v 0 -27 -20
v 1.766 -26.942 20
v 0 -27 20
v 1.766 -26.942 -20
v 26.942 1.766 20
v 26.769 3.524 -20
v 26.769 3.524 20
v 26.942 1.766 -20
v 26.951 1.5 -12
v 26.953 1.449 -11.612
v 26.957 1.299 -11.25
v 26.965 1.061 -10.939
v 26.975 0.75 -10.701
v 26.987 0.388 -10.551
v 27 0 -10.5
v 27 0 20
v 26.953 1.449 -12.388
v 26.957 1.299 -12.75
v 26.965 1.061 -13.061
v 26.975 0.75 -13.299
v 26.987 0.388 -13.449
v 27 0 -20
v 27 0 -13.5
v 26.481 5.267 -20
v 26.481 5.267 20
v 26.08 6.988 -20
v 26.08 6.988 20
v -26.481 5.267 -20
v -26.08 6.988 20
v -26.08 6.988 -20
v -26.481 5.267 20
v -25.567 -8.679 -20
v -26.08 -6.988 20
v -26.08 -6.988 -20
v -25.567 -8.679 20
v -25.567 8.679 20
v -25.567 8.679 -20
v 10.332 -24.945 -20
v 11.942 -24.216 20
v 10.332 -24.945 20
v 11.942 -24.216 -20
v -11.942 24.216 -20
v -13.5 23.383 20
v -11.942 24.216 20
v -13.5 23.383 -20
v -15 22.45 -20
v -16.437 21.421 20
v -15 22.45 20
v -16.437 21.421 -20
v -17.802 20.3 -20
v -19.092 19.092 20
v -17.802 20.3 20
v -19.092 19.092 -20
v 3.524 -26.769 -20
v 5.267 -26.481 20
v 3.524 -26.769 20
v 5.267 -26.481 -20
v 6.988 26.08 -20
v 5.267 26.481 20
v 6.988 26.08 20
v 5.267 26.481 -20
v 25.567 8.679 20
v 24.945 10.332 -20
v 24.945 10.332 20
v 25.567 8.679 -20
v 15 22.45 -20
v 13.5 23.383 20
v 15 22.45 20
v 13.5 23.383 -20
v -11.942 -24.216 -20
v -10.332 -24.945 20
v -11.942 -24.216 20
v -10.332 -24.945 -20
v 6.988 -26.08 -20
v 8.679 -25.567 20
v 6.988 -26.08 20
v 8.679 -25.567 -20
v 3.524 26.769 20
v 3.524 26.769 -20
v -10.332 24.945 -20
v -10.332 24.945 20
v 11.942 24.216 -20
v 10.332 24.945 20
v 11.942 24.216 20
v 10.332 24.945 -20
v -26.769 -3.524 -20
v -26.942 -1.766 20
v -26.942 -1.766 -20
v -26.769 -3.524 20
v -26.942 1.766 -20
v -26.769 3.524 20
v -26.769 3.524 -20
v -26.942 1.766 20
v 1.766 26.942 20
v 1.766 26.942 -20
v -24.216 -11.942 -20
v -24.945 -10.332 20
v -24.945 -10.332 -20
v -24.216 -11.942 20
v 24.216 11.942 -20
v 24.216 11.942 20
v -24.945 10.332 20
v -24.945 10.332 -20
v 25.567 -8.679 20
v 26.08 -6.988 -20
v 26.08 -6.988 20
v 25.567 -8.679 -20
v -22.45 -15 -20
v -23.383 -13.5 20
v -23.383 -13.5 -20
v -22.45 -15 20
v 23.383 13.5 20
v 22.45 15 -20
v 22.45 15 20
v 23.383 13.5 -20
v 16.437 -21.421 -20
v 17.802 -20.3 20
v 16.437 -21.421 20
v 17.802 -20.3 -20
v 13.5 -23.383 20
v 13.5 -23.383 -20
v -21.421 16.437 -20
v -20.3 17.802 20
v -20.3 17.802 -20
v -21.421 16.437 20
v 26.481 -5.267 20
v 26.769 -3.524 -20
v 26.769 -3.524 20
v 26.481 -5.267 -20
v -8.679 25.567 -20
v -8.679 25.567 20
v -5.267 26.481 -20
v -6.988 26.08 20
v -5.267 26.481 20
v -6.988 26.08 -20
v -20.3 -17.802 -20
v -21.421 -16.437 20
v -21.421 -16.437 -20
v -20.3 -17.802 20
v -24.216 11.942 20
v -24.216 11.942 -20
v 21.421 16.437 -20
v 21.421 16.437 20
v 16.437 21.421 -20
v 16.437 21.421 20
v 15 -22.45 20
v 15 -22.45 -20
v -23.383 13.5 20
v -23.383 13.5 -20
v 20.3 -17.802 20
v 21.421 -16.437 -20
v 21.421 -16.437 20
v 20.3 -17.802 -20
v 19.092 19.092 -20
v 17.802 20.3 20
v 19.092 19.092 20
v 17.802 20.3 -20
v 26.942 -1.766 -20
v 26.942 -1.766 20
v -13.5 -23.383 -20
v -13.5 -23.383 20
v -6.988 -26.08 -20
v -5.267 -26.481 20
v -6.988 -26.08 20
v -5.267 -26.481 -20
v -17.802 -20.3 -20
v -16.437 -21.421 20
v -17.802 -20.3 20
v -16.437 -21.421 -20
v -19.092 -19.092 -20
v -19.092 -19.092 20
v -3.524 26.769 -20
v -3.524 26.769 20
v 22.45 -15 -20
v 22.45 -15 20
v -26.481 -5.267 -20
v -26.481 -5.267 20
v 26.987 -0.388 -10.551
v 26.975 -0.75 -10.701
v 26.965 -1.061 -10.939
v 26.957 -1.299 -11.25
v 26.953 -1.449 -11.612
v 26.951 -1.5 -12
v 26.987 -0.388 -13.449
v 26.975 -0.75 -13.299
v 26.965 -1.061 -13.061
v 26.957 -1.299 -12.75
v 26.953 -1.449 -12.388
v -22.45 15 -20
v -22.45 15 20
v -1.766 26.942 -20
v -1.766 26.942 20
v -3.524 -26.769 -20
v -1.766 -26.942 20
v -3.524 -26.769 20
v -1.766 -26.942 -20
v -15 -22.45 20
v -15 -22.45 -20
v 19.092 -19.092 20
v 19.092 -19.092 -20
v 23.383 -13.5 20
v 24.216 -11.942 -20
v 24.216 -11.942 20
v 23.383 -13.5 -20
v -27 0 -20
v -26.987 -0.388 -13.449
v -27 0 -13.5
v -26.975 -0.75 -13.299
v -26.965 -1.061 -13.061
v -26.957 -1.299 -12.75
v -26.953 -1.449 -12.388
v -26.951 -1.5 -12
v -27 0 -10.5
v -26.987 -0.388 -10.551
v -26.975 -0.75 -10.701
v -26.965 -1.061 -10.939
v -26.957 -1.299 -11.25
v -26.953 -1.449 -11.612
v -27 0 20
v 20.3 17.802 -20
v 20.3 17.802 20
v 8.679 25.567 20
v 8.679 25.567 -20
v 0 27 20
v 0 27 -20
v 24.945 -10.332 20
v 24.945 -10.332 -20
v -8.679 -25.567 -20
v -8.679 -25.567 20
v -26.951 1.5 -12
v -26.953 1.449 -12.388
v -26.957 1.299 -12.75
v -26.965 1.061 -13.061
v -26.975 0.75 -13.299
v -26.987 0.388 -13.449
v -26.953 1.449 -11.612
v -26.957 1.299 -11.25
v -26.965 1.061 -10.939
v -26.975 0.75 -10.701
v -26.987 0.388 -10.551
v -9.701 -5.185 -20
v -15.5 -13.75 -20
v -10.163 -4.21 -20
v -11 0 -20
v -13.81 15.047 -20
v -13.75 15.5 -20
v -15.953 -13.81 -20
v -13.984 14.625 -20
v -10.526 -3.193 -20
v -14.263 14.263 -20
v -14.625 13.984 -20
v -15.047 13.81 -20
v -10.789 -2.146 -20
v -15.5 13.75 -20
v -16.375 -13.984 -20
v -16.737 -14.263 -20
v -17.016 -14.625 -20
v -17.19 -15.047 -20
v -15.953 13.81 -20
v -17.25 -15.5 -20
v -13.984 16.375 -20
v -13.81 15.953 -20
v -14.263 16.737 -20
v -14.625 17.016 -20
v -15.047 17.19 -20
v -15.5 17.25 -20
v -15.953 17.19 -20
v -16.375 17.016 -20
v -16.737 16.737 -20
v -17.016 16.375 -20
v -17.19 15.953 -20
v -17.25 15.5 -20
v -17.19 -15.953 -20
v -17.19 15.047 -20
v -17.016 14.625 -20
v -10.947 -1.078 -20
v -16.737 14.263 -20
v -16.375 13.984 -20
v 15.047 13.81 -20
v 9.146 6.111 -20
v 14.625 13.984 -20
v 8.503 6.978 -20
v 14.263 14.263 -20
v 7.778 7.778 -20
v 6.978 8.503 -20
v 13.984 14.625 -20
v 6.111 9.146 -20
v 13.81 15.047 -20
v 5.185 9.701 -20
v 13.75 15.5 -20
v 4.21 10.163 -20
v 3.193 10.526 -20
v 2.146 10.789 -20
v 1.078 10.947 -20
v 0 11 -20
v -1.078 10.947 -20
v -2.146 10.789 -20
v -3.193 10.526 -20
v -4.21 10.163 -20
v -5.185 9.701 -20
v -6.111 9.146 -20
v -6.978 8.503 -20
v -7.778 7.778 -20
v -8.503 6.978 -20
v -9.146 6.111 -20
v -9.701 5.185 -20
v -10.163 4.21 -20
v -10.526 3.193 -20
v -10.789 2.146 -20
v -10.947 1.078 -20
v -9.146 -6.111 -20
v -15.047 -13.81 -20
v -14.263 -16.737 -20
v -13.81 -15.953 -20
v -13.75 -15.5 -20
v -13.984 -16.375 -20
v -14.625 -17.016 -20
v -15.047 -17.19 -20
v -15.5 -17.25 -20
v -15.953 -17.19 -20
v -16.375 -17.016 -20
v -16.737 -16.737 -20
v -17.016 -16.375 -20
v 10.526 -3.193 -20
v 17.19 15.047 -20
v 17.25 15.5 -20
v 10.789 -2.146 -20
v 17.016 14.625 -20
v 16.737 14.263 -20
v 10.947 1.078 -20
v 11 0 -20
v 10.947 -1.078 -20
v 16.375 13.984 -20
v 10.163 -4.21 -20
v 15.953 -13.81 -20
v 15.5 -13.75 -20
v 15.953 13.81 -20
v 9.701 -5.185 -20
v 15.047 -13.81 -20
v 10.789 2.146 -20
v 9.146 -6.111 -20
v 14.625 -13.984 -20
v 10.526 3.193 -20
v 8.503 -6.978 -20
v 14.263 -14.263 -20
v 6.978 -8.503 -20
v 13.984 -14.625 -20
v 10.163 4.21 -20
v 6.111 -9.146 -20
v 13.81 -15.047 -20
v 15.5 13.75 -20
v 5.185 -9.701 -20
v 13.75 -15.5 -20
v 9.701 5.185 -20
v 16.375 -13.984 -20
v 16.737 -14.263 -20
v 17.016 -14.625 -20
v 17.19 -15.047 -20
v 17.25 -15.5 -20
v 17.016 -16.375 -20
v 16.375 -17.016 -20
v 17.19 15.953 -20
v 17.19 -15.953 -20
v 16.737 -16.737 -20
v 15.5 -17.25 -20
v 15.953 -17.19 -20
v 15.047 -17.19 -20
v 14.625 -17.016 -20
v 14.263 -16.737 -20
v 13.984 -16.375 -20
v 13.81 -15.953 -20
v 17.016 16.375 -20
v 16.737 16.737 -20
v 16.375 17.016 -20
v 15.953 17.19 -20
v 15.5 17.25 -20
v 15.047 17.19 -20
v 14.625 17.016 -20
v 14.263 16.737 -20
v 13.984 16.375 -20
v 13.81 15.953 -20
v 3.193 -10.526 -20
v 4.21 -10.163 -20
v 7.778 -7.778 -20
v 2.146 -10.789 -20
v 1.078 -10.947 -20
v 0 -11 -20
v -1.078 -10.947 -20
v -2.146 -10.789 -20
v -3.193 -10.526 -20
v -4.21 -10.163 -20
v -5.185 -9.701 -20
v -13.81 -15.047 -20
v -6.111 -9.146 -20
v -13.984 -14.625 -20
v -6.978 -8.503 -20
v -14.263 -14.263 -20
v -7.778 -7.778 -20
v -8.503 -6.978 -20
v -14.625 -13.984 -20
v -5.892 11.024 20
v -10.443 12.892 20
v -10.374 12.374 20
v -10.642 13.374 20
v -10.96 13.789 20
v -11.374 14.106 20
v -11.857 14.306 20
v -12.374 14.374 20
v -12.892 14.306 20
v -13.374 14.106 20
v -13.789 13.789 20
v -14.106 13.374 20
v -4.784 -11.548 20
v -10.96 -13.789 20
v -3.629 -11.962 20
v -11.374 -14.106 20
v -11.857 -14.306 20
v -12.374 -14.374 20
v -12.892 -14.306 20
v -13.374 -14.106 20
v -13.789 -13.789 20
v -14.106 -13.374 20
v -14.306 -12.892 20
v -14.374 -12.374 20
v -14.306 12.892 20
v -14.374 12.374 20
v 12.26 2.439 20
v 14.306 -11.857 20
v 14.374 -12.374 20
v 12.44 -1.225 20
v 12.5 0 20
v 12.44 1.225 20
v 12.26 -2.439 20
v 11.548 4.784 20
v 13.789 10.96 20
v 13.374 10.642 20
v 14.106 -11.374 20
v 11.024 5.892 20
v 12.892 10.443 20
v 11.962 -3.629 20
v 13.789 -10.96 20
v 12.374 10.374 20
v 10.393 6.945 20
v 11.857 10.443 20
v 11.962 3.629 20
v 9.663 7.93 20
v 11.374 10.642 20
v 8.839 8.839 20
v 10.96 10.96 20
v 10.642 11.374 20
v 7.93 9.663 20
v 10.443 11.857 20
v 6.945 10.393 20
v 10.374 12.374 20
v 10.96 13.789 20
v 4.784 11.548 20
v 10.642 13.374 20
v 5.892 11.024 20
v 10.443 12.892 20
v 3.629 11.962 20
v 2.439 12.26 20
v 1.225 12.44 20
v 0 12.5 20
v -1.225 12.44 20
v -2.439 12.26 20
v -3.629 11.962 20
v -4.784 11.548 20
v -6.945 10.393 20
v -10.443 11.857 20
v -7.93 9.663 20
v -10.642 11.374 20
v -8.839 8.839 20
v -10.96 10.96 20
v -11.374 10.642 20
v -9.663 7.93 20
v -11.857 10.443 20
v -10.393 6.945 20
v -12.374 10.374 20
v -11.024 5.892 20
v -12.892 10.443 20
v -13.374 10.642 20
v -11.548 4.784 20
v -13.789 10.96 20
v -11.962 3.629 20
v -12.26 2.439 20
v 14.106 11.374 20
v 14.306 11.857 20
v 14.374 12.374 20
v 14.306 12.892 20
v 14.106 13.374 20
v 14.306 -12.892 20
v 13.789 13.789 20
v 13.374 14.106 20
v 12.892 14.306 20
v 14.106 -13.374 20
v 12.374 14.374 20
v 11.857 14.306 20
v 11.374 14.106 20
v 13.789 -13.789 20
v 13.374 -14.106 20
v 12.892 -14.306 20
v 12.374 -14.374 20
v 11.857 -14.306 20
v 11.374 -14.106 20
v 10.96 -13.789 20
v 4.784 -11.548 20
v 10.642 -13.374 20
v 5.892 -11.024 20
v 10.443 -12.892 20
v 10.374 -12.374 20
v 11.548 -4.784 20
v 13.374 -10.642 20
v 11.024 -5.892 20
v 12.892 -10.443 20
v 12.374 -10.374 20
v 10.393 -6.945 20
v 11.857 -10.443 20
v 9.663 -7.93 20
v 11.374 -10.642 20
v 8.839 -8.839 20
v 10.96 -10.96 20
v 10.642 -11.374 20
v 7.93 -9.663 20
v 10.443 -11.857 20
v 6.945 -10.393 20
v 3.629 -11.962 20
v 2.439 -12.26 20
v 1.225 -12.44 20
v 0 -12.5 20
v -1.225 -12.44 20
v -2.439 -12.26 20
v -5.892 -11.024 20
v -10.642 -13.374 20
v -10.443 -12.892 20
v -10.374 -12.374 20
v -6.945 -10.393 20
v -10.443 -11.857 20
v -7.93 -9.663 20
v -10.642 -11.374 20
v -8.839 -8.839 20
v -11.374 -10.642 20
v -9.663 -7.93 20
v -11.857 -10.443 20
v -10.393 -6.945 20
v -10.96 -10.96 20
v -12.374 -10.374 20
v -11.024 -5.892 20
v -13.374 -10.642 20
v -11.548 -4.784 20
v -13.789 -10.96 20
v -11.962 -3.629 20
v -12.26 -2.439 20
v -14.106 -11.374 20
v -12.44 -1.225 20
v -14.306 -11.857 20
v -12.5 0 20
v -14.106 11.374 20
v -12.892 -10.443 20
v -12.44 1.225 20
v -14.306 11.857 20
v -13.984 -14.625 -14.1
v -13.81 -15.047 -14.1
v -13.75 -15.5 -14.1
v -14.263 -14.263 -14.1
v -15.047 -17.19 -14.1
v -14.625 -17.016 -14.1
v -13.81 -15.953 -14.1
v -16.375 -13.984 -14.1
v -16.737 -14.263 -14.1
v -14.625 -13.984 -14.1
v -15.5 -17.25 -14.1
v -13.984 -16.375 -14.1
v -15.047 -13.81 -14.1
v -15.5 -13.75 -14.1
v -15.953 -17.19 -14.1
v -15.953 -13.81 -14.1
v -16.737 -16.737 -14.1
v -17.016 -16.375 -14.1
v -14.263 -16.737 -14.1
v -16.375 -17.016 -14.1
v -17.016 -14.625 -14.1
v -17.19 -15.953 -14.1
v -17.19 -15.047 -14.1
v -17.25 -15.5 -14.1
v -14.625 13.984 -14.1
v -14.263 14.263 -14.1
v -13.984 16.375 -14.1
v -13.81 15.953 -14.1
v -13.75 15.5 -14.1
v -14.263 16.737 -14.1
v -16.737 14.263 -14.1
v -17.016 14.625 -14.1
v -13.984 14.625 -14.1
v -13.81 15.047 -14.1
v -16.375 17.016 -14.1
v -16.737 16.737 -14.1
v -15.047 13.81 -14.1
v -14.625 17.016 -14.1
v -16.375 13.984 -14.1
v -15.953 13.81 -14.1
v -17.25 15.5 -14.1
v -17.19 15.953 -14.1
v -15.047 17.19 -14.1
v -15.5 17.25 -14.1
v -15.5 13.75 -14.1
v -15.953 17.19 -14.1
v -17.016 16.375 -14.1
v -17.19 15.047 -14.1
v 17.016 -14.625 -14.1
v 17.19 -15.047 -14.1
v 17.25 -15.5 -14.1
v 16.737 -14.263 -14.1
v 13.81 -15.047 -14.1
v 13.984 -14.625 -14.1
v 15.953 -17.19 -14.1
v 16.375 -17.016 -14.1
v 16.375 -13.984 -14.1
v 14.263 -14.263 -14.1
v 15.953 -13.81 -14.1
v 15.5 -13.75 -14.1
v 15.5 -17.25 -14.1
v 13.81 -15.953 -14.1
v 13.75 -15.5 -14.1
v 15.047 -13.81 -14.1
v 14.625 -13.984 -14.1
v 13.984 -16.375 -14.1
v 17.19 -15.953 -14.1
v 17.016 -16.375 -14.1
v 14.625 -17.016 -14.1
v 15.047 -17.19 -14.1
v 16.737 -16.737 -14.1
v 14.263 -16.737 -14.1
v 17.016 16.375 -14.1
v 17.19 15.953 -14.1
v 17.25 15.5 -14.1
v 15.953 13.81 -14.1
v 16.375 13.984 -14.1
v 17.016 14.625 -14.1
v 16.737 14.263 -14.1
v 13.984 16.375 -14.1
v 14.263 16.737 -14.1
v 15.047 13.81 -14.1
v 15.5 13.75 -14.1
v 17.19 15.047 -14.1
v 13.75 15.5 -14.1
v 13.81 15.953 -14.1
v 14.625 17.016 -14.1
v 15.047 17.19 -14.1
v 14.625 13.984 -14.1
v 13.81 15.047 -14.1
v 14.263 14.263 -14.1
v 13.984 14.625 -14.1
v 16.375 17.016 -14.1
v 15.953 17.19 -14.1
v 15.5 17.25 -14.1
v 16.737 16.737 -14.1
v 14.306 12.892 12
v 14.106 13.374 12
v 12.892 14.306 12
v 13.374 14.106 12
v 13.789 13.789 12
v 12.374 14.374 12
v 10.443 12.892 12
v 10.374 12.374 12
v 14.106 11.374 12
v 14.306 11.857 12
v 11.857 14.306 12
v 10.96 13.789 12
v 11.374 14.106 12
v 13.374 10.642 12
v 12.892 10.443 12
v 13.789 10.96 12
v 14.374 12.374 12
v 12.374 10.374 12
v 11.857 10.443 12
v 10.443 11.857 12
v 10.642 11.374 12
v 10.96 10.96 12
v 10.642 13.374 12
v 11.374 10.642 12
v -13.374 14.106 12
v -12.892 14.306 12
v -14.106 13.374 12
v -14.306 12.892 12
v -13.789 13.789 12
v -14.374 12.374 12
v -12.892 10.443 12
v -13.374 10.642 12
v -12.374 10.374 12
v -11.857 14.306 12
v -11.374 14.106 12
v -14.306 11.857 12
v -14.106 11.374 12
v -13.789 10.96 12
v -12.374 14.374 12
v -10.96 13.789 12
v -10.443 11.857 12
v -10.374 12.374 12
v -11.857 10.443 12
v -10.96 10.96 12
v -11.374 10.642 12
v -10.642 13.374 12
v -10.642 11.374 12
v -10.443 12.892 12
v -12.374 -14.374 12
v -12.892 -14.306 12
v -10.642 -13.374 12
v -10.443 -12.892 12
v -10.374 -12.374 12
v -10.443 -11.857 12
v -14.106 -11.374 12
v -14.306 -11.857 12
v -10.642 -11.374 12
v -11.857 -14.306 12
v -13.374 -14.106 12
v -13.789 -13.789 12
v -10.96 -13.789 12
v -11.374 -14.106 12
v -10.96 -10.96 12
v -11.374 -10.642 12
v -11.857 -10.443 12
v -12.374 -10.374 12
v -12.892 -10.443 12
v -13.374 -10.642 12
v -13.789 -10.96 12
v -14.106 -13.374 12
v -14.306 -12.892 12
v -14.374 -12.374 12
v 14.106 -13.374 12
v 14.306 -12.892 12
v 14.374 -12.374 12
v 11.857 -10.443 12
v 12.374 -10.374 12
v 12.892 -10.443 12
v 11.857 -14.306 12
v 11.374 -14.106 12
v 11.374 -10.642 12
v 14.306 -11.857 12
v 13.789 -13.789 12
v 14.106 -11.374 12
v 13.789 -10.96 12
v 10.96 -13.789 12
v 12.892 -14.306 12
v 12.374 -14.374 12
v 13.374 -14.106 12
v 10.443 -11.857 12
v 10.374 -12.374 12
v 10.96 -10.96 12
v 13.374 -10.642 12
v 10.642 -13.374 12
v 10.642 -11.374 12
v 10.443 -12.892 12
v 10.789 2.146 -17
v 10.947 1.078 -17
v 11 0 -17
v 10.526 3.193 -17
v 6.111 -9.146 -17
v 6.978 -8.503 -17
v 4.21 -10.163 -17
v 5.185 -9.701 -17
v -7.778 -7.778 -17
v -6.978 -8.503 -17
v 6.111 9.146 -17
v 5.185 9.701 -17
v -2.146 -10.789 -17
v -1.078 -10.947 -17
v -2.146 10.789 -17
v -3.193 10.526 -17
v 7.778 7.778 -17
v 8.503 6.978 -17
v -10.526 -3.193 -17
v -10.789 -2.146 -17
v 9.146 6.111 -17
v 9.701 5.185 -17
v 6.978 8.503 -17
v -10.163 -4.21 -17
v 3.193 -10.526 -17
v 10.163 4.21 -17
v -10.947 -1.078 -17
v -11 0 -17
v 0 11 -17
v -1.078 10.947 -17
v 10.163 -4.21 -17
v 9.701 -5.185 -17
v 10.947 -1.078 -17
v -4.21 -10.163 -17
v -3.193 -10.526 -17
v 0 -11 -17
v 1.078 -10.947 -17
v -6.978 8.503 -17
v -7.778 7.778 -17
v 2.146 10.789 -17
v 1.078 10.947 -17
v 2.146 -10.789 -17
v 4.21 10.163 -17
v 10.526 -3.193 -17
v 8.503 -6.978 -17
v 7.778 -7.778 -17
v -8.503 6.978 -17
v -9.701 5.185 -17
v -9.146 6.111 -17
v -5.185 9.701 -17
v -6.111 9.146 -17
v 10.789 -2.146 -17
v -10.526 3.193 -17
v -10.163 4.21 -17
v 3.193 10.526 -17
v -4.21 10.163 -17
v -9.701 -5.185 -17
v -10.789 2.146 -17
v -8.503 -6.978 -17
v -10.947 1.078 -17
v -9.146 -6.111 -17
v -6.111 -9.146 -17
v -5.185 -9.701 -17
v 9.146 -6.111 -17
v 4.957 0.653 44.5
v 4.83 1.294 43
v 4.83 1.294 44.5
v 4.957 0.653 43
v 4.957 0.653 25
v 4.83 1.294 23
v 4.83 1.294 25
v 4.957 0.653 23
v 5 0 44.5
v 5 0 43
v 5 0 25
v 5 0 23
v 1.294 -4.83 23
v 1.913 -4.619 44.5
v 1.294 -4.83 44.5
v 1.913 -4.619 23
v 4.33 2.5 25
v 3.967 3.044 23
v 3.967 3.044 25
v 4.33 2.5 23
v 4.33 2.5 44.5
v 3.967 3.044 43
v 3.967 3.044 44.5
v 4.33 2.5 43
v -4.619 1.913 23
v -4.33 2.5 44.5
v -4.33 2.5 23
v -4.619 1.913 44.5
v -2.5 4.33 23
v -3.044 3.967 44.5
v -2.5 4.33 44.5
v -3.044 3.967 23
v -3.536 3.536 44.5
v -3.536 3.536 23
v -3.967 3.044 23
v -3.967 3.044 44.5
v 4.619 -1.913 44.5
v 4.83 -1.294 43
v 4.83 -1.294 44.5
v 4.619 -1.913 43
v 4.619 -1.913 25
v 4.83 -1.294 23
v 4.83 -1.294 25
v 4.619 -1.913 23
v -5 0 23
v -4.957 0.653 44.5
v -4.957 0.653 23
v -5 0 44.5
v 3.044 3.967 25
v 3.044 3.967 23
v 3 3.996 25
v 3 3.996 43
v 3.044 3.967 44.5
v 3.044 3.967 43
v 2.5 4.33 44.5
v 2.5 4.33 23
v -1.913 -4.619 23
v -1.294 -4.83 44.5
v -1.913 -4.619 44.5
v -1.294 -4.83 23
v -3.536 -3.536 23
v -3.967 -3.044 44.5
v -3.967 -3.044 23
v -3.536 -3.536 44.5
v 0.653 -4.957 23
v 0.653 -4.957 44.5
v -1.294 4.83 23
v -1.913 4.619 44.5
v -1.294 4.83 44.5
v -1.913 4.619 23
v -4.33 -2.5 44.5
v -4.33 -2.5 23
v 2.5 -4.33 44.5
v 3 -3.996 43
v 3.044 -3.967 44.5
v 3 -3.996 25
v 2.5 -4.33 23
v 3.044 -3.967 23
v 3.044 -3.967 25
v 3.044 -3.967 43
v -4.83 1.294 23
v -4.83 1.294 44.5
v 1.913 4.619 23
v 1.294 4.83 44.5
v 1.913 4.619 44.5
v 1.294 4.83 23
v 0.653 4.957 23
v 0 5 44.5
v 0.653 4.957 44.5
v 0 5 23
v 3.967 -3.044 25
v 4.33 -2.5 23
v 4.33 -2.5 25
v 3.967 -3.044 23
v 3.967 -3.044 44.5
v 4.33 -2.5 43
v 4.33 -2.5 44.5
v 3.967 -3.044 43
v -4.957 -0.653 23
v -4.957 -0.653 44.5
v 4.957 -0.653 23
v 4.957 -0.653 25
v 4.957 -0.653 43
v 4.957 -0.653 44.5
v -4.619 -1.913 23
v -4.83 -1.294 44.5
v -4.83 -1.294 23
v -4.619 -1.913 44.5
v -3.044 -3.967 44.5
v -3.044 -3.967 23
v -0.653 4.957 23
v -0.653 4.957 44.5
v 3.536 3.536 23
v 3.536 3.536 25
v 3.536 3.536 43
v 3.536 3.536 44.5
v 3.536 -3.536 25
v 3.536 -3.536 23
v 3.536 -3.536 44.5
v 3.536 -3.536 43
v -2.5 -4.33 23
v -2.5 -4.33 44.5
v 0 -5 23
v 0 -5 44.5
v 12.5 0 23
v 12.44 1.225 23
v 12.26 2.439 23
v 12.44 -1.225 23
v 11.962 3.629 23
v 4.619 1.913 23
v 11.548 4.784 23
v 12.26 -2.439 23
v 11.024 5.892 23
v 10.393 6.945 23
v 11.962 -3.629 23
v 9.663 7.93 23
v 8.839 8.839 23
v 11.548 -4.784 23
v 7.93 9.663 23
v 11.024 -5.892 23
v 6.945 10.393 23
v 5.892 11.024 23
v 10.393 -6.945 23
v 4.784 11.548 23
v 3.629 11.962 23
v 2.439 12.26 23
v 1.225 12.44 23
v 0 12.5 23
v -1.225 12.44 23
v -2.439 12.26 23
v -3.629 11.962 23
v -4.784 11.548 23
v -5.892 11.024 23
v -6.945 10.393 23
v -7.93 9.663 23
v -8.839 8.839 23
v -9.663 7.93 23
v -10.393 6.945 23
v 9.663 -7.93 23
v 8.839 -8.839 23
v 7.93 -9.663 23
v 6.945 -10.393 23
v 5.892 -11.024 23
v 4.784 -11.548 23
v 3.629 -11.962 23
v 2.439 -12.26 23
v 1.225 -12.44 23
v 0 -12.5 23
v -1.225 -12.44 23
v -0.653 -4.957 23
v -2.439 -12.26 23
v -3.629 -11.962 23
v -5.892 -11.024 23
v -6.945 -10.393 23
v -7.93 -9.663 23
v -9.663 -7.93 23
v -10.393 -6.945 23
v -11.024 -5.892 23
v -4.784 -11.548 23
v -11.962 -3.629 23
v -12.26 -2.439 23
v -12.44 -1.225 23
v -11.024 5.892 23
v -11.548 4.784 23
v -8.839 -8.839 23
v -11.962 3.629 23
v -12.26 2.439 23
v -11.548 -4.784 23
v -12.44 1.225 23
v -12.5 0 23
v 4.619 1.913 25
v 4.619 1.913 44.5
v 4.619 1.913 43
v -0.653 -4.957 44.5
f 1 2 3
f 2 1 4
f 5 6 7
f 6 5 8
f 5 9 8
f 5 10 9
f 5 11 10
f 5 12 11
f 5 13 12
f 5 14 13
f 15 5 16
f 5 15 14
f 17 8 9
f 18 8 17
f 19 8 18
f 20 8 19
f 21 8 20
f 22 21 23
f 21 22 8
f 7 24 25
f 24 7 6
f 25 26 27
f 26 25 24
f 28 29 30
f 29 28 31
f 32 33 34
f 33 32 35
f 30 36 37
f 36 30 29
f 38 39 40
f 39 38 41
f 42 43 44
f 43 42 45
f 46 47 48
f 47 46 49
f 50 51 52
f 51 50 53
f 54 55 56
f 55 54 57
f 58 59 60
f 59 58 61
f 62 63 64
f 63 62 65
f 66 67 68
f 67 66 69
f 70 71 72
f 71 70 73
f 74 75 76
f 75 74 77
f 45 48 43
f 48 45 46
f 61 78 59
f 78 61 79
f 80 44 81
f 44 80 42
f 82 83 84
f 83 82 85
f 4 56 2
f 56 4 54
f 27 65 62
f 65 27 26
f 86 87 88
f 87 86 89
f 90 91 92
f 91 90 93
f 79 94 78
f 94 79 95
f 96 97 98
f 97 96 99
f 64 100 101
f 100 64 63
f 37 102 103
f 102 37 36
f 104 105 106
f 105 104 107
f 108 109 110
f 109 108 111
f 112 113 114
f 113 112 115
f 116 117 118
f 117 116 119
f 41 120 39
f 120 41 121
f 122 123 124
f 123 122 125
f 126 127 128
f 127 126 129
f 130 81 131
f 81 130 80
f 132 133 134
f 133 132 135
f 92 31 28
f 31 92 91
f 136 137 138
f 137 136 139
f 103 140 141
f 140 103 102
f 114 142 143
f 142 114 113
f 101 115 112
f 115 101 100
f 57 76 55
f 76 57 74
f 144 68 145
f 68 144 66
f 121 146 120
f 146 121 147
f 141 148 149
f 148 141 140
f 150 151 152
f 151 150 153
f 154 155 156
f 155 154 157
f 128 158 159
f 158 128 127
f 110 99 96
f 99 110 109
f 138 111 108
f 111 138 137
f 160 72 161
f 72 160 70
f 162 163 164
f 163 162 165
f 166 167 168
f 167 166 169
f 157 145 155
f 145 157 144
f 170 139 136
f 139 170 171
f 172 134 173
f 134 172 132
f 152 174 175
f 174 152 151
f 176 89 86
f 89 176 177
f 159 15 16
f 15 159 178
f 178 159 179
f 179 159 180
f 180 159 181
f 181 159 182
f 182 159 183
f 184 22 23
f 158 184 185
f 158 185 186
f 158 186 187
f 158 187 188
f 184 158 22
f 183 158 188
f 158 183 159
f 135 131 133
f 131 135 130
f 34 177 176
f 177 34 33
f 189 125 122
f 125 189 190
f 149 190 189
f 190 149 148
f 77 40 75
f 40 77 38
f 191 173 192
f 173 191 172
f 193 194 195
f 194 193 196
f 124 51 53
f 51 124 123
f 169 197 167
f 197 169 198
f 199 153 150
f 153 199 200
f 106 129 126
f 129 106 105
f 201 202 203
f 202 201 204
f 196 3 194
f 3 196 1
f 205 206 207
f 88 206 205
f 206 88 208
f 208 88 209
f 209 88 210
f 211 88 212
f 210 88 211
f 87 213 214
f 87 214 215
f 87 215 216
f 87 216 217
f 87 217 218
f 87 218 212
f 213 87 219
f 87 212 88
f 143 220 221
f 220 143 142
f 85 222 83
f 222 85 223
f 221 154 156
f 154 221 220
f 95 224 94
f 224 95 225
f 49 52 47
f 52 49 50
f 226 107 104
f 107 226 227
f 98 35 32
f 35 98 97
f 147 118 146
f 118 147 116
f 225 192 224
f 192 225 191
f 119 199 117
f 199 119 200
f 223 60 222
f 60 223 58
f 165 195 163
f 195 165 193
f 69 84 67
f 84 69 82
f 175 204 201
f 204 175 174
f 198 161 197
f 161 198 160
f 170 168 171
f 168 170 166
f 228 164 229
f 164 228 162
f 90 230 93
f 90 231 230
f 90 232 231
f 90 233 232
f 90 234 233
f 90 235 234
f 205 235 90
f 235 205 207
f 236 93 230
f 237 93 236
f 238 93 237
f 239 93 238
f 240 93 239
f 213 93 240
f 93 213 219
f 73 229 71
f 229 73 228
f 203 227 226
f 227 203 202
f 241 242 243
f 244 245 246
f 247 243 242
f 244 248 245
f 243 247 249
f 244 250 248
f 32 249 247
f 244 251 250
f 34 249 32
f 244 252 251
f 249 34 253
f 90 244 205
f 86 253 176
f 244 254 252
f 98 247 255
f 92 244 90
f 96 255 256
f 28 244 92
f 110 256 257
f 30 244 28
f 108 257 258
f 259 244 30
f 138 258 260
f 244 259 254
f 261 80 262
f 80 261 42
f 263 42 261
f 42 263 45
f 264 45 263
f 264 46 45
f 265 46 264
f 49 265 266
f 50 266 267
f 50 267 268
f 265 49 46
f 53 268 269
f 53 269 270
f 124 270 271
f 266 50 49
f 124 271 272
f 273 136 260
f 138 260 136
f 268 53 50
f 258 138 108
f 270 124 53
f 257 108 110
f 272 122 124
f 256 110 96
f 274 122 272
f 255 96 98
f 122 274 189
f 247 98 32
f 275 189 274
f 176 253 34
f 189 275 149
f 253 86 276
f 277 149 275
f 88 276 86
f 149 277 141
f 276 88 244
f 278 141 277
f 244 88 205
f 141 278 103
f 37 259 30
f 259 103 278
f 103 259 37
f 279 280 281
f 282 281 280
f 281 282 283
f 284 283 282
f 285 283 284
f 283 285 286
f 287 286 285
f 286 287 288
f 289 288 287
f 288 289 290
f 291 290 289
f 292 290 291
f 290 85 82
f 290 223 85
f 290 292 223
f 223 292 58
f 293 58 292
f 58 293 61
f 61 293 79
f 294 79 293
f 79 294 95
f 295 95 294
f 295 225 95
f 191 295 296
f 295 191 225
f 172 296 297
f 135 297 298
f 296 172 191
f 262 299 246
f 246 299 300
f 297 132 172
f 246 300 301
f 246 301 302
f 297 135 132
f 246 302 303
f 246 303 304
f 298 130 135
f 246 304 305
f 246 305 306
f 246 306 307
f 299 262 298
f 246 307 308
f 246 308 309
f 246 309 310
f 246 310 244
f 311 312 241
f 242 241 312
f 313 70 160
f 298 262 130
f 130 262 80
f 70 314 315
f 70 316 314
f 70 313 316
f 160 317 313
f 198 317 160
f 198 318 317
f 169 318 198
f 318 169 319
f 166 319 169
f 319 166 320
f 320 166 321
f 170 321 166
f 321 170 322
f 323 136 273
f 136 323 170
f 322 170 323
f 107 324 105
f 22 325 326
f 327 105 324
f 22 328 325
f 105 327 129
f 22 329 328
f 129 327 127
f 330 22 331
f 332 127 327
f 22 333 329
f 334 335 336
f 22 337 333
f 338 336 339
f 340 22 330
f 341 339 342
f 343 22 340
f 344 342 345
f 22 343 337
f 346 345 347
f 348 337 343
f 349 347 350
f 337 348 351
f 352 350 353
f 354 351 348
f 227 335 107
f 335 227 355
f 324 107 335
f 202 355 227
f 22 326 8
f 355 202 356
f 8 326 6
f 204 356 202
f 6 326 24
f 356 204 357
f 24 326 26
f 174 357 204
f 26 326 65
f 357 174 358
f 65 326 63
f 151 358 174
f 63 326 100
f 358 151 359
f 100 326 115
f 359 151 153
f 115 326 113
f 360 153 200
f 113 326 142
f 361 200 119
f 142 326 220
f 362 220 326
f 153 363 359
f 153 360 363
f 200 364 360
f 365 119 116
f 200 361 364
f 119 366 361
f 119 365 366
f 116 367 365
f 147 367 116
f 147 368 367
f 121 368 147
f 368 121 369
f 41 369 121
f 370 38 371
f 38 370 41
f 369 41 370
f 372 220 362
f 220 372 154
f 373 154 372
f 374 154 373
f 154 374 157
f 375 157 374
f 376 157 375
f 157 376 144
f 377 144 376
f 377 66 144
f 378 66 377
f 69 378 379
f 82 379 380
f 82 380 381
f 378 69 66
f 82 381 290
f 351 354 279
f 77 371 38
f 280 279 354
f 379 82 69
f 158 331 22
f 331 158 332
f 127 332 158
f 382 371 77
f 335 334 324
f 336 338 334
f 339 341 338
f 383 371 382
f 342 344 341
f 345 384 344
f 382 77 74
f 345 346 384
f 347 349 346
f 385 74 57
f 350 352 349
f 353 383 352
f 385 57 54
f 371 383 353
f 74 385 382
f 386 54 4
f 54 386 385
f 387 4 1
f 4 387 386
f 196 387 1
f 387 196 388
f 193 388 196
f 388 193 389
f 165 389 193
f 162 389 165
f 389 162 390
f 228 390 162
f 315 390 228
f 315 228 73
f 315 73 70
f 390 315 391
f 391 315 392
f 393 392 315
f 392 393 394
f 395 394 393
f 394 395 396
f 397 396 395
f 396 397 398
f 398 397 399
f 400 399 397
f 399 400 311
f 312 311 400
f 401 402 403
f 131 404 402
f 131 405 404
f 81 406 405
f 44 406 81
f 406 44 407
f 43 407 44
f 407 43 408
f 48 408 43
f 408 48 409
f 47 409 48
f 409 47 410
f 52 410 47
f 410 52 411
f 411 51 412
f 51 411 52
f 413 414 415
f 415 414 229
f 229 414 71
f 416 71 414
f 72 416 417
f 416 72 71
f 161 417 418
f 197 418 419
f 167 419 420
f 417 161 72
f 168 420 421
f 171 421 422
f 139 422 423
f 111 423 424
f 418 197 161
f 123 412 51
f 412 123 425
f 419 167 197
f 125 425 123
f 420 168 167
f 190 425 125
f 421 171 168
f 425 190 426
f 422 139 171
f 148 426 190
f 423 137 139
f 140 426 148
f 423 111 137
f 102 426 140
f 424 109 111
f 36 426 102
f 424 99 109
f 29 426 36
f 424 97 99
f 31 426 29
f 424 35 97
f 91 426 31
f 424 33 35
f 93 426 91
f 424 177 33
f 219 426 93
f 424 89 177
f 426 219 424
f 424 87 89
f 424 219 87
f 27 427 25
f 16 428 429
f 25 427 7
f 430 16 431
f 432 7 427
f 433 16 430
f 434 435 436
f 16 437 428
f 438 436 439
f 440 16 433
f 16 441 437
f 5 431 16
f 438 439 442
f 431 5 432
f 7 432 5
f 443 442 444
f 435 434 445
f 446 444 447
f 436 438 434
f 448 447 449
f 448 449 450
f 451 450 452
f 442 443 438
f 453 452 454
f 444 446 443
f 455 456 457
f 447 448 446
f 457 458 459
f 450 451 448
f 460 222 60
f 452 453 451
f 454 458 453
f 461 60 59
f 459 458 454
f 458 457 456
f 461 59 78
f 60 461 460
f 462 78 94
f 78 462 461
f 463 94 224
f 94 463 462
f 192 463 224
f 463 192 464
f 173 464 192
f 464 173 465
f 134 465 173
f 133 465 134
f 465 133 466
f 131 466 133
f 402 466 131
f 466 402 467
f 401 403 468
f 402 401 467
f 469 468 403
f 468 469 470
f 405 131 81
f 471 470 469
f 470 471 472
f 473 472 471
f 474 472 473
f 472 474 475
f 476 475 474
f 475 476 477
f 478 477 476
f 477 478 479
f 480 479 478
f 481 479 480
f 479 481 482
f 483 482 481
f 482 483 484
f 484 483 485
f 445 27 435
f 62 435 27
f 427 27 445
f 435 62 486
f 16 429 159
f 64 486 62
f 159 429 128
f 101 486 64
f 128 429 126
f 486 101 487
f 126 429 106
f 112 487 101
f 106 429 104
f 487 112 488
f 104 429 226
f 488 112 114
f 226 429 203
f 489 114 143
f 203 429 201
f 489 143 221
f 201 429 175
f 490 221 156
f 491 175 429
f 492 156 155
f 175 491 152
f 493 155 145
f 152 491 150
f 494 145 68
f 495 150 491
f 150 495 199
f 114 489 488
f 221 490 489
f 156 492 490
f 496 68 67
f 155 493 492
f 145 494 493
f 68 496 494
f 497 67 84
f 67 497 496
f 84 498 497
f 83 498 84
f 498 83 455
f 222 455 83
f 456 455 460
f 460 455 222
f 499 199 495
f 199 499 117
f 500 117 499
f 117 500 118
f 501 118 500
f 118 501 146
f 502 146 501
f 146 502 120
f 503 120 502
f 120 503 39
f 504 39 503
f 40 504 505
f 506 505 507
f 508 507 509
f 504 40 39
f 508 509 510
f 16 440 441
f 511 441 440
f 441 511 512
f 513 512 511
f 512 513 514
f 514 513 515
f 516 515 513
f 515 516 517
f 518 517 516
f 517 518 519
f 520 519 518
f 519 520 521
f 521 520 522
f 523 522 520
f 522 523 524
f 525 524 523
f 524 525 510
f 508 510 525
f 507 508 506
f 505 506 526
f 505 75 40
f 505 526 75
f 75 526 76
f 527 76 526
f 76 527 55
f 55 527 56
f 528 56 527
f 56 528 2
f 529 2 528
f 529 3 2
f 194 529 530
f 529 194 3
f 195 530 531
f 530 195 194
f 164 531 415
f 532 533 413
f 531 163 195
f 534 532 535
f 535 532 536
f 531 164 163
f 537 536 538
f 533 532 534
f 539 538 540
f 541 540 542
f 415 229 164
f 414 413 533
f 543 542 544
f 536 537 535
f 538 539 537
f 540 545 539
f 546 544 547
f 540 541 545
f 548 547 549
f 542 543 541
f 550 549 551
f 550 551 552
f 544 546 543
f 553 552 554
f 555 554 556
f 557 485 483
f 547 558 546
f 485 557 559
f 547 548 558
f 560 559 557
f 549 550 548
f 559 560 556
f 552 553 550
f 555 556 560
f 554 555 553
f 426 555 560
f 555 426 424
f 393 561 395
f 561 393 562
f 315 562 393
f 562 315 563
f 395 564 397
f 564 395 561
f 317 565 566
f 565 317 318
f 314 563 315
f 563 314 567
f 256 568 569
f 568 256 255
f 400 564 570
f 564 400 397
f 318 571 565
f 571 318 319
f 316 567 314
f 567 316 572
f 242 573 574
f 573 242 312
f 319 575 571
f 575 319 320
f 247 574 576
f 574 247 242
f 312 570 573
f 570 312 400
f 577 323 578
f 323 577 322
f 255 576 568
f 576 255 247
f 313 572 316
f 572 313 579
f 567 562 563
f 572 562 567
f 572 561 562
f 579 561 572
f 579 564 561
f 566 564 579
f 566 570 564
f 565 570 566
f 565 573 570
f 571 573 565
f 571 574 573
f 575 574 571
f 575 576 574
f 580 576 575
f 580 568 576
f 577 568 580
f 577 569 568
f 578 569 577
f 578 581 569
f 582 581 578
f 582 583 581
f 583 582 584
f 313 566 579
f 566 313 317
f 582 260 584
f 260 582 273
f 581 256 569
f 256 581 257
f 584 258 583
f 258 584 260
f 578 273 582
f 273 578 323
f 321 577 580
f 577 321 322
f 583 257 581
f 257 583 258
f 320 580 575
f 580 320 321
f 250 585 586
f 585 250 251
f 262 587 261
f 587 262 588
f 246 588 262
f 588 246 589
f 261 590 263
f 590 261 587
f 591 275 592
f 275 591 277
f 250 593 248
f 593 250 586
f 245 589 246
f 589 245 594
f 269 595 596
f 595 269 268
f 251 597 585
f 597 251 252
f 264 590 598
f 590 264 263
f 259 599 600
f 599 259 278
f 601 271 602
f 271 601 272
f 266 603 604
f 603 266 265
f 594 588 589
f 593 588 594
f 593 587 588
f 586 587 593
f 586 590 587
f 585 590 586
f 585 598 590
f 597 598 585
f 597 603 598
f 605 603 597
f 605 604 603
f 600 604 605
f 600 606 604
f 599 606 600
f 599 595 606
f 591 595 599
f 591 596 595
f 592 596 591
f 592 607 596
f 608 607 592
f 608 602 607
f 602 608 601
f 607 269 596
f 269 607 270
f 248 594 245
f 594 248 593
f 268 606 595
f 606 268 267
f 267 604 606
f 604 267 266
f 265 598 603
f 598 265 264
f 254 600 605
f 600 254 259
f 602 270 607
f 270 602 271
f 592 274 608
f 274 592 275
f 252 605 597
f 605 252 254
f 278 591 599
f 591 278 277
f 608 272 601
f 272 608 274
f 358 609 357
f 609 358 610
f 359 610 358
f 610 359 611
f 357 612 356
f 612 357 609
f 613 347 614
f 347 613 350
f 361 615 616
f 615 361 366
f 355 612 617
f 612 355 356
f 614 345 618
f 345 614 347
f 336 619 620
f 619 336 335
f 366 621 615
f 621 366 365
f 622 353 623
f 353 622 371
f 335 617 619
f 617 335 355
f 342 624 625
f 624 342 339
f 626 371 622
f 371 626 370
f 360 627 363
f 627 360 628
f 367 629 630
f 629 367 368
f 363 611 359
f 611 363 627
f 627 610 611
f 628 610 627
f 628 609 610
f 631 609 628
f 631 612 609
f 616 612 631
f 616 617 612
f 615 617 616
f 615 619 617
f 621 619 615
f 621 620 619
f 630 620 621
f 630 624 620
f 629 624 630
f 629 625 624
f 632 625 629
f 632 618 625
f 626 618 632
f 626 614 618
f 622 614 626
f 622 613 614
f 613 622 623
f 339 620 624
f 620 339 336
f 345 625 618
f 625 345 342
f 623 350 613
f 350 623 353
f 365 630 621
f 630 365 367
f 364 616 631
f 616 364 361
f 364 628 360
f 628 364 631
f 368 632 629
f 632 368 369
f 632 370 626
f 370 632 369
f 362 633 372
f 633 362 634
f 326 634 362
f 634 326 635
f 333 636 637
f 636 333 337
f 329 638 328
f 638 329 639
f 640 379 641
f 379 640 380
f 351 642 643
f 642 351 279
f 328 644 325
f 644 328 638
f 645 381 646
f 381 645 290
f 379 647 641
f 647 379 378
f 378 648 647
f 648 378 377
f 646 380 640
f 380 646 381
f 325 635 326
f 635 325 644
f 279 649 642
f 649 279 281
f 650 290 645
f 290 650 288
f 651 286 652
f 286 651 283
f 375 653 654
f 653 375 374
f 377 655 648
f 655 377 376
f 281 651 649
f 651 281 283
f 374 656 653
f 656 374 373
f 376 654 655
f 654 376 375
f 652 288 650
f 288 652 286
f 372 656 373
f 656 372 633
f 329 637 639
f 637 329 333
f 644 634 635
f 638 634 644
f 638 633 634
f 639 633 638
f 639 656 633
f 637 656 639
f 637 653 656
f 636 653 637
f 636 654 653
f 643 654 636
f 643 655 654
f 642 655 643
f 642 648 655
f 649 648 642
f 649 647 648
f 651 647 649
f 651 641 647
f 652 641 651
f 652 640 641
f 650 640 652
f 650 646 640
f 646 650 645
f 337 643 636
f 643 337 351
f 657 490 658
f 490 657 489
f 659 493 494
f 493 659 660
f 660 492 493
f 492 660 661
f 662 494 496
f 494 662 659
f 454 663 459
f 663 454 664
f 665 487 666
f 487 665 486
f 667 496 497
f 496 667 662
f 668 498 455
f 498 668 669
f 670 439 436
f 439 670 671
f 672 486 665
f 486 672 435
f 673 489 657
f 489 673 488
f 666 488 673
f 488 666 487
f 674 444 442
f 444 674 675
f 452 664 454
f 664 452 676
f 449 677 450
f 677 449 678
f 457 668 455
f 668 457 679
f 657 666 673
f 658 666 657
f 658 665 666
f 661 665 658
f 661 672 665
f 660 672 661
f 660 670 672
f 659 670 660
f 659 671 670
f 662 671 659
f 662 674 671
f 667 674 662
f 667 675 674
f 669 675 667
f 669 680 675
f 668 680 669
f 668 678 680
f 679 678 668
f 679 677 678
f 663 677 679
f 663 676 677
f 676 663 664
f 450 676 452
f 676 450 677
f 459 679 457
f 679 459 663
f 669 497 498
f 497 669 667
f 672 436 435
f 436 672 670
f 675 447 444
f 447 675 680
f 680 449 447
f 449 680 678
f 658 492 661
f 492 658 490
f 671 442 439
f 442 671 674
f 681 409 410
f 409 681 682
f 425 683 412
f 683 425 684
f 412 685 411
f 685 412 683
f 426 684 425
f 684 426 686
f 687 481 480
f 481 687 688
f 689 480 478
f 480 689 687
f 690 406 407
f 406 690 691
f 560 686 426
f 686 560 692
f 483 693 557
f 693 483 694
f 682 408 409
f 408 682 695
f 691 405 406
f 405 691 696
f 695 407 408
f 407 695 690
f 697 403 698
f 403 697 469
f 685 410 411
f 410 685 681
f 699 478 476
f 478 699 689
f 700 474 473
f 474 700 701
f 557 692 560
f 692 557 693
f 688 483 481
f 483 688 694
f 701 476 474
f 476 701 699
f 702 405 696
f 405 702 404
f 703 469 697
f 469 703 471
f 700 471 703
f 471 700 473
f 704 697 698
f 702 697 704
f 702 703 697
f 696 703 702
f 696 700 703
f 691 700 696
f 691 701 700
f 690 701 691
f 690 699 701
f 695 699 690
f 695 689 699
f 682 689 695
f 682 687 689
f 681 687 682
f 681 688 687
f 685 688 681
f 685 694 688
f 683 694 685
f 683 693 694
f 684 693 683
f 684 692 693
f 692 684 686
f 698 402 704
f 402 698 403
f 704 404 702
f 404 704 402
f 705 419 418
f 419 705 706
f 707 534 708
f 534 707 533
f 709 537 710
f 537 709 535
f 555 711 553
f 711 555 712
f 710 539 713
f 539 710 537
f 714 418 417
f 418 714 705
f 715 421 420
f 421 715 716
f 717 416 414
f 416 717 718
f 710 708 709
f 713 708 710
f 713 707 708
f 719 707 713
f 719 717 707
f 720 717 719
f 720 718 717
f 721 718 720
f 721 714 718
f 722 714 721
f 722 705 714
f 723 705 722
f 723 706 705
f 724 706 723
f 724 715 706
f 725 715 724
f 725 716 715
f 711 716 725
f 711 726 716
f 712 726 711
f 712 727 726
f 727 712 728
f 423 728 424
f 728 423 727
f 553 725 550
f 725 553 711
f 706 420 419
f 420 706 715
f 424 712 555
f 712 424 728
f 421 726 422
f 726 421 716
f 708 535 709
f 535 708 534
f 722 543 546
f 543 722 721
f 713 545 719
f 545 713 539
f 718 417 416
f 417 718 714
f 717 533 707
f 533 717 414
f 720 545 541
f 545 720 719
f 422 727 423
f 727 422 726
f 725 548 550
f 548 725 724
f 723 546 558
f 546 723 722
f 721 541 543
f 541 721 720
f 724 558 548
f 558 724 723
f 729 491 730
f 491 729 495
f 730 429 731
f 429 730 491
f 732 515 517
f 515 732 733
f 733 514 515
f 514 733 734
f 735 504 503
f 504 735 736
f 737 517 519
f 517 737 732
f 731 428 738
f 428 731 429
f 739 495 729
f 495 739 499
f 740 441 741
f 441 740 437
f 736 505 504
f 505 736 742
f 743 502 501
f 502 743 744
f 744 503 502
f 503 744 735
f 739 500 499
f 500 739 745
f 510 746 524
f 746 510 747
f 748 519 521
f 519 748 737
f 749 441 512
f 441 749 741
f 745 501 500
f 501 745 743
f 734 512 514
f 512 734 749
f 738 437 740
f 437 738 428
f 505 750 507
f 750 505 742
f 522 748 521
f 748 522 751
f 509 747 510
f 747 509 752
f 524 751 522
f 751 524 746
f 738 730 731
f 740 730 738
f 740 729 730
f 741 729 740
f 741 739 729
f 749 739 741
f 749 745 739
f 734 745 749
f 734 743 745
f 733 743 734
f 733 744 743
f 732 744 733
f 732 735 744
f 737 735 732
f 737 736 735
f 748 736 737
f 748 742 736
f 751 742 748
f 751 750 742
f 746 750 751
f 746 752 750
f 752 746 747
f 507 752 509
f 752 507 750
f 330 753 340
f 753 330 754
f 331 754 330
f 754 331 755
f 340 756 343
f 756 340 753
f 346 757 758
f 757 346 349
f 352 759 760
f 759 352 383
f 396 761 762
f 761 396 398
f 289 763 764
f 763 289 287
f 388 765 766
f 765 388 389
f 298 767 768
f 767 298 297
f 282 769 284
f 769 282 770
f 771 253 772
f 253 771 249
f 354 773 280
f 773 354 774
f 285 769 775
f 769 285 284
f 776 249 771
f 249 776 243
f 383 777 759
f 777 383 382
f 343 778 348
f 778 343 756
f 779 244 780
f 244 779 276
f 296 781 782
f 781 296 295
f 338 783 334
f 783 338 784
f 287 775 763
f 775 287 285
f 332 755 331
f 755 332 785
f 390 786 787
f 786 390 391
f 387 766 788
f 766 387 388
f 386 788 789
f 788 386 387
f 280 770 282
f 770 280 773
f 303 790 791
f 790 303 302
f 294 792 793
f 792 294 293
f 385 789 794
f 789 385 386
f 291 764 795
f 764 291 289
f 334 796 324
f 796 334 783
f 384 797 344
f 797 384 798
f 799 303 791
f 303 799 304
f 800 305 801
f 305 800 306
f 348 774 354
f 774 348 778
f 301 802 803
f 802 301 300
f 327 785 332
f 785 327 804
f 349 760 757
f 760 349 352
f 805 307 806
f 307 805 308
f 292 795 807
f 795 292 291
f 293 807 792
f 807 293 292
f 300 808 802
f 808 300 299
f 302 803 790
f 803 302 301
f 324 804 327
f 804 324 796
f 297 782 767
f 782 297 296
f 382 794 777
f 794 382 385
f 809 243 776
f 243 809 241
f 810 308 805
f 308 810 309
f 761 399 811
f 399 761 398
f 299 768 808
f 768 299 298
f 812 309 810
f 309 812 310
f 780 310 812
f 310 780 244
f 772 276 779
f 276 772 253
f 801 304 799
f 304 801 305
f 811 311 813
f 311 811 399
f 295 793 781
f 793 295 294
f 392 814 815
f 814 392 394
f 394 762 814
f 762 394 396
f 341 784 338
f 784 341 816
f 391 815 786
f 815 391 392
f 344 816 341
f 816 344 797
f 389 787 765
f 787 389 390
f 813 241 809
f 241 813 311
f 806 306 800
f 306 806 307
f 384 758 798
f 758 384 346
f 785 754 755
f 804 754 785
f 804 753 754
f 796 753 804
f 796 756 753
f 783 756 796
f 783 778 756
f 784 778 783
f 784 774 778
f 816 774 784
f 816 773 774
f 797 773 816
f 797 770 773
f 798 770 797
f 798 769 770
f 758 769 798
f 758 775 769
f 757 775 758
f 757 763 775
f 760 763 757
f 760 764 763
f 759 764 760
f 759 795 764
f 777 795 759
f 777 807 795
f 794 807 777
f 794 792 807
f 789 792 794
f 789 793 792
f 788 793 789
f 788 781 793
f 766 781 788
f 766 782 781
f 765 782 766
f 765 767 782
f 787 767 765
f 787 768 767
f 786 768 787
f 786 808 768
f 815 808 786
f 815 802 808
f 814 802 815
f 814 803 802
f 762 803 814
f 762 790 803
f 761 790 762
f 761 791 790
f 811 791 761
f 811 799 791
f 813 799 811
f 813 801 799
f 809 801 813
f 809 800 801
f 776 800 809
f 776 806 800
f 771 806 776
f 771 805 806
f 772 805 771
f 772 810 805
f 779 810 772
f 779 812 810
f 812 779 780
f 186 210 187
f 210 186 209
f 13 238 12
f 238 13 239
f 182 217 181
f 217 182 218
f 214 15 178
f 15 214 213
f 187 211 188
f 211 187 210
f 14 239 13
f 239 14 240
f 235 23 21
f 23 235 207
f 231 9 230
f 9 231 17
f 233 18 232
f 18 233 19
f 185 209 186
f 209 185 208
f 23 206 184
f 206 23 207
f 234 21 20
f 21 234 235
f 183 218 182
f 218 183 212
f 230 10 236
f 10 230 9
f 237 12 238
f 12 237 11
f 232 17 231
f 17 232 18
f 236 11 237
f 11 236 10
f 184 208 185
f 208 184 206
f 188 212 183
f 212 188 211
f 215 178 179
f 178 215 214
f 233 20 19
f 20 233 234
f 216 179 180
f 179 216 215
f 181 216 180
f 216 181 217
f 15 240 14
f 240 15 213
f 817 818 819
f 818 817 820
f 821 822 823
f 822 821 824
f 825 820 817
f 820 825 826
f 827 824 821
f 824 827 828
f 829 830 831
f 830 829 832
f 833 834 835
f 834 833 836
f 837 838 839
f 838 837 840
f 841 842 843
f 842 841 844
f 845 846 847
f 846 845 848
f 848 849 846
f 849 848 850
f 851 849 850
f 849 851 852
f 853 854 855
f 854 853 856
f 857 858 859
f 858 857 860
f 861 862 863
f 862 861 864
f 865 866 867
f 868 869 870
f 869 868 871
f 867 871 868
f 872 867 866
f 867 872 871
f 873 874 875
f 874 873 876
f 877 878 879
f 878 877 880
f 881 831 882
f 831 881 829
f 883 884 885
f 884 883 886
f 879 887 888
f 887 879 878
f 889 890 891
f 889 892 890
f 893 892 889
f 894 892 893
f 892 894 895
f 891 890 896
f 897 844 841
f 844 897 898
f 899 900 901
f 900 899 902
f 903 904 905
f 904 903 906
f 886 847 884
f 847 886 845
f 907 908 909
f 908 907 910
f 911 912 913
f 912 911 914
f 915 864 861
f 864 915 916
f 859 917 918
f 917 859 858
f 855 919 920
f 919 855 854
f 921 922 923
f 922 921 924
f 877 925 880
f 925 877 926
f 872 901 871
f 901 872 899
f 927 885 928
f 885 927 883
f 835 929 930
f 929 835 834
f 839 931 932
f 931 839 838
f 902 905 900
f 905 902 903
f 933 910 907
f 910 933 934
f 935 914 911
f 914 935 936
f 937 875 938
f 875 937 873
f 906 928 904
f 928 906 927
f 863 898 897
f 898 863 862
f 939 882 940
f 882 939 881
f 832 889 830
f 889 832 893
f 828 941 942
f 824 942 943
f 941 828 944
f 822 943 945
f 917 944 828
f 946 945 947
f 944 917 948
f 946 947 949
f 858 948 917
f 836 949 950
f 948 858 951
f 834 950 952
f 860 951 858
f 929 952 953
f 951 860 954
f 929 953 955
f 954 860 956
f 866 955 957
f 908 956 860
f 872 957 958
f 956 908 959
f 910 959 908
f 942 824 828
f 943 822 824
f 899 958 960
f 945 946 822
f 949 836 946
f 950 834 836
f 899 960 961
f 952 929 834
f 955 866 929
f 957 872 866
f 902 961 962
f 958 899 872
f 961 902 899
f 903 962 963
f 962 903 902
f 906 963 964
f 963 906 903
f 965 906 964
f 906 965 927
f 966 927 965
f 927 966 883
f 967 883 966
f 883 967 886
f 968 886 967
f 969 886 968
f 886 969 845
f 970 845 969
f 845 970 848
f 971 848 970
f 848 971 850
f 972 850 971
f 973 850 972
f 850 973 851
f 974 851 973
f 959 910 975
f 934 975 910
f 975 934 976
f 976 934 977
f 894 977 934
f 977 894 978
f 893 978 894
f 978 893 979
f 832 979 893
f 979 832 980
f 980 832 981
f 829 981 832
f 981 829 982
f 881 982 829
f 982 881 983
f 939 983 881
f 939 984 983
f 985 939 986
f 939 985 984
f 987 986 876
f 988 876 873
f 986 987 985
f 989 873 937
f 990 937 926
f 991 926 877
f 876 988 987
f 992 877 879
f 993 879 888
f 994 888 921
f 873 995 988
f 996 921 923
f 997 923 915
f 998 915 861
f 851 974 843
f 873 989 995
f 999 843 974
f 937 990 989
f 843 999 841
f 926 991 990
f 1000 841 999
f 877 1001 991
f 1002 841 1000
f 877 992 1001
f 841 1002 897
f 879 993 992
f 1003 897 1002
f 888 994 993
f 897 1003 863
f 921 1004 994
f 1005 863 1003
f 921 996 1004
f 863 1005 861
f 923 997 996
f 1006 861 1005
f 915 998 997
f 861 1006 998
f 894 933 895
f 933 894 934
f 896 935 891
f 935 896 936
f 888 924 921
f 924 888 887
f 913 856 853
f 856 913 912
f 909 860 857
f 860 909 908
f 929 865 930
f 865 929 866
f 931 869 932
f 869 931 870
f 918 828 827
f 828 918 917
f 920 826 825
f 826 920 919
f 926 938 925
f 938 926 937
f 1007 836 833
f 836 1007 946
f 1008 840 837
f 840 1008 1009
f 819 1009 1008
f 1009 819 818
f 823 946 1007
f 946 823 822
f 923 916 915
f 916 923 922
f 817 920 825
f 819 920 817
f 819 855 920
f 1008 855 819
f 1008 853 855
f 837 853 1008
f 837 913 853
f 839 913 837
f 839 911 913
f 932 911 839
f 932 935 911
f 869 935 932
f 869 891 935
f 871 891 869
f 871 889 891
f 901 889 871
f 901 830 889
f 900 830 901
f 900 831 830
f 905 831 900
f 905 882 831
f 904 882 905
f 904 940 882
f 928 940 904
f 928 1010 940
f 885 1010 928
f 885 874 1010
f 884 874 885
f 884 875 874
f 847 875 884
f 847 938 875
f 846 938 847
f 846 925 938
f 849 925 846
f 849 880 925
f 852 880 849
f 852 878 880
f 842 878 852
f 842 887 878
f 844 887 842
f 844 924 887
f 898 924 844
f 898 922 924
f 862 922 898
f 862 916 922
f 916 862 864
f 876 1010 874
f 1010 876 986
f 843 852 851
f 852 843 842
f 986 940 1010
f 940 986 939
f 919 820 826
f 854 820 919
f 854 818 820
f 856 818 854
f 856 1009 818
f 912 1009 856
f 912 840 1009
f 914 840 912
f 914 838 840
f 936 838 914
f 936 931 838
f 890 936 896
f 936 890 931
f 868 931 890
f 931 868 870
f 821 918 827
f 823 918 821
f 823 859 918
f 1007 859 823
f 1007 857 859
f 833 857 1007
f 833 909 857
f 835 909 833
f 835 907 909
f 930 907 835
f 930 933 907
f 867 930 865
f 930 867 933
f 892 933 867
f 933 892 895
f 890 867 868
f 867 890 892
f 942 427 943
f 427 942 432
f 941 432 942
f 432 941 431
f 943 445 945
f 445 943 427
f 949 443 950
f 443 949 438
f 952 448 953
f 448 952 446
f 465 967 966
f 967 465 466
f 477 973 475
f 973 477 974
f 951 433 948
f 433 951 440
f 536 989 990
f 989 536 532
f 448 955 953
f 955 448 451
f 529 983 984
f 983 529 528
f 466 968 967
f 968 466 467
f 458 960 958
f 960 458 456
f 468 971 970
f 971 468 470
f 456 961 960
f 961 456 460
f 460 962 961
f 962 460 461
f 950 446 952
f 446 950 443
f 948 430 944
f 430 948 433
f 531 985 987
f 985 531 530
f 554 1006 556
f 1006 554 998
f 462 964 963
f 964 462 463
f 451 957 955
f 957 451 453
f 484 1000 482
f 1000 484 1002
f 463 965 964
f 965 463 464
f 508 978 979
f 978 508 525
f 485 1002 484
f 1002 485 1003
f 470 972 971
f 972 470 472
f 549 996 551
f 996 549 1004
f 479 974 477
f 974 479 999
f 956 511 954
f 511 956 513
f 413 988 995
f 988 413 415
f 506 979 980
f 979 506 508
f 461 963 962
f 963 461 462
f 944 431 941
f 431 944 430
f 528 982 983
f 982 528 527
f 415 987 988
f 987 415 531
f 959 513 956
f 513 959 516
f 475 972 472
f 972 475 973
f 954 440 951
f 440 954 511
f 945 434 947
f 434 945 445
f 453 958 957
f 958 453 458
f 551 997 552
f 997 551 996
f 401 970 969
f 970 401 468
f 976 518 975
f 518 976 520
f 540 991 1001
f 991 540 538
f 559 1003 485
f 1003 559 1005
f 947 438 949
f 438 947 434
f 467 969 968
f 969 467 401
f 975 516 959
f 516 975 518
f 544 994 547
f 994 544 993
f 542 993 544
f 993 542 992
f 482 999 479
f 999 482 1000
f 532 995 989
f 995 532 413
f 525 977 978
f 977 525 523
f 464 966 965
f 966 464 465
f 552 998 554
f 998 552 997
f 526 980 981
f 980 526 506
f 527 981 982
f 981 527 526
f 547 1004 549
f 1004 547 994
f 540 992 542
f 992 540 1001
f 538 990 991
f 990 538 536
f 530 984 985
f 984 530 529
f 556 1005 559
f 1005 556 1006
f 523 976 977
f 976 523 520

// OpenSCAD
use <common.scad>

// 용어:
// 1. 유성 감속기(planetary gearbox)
// 2. 입력 플랜지(input flange)
// 3. 본체 길이(body length)
// 4. 출력축 지름(output shaft diameter)
// 5. 감속비(reduction ratio)

// STEPPERONLINE MG17-G10 유성 감속기(planetary gearbox)는 NEMA17 입력 플랜지(input flange)와 감속비(reduction ratio) 10:1 기준입니다.
// 사양 배열: [입력 플랜지(input flange), 본체 길이(body length), 출력축 지름(output shaft diameter), 감속비(reduction ratio)], mm
function planetary_gearbox_mg17_g10_spec() = [42, 40, 10, 10];

module planetary_gearbox_mg17_g10(part_color = [0, 0.85, 0.85]) {
    body_len = planetary_gearbox_mg17_g10_spec()[1];
    gearbox_mg17(body_len = body_len, part_color = part_color);
}

planetary_gearbox_mg17_g10();
